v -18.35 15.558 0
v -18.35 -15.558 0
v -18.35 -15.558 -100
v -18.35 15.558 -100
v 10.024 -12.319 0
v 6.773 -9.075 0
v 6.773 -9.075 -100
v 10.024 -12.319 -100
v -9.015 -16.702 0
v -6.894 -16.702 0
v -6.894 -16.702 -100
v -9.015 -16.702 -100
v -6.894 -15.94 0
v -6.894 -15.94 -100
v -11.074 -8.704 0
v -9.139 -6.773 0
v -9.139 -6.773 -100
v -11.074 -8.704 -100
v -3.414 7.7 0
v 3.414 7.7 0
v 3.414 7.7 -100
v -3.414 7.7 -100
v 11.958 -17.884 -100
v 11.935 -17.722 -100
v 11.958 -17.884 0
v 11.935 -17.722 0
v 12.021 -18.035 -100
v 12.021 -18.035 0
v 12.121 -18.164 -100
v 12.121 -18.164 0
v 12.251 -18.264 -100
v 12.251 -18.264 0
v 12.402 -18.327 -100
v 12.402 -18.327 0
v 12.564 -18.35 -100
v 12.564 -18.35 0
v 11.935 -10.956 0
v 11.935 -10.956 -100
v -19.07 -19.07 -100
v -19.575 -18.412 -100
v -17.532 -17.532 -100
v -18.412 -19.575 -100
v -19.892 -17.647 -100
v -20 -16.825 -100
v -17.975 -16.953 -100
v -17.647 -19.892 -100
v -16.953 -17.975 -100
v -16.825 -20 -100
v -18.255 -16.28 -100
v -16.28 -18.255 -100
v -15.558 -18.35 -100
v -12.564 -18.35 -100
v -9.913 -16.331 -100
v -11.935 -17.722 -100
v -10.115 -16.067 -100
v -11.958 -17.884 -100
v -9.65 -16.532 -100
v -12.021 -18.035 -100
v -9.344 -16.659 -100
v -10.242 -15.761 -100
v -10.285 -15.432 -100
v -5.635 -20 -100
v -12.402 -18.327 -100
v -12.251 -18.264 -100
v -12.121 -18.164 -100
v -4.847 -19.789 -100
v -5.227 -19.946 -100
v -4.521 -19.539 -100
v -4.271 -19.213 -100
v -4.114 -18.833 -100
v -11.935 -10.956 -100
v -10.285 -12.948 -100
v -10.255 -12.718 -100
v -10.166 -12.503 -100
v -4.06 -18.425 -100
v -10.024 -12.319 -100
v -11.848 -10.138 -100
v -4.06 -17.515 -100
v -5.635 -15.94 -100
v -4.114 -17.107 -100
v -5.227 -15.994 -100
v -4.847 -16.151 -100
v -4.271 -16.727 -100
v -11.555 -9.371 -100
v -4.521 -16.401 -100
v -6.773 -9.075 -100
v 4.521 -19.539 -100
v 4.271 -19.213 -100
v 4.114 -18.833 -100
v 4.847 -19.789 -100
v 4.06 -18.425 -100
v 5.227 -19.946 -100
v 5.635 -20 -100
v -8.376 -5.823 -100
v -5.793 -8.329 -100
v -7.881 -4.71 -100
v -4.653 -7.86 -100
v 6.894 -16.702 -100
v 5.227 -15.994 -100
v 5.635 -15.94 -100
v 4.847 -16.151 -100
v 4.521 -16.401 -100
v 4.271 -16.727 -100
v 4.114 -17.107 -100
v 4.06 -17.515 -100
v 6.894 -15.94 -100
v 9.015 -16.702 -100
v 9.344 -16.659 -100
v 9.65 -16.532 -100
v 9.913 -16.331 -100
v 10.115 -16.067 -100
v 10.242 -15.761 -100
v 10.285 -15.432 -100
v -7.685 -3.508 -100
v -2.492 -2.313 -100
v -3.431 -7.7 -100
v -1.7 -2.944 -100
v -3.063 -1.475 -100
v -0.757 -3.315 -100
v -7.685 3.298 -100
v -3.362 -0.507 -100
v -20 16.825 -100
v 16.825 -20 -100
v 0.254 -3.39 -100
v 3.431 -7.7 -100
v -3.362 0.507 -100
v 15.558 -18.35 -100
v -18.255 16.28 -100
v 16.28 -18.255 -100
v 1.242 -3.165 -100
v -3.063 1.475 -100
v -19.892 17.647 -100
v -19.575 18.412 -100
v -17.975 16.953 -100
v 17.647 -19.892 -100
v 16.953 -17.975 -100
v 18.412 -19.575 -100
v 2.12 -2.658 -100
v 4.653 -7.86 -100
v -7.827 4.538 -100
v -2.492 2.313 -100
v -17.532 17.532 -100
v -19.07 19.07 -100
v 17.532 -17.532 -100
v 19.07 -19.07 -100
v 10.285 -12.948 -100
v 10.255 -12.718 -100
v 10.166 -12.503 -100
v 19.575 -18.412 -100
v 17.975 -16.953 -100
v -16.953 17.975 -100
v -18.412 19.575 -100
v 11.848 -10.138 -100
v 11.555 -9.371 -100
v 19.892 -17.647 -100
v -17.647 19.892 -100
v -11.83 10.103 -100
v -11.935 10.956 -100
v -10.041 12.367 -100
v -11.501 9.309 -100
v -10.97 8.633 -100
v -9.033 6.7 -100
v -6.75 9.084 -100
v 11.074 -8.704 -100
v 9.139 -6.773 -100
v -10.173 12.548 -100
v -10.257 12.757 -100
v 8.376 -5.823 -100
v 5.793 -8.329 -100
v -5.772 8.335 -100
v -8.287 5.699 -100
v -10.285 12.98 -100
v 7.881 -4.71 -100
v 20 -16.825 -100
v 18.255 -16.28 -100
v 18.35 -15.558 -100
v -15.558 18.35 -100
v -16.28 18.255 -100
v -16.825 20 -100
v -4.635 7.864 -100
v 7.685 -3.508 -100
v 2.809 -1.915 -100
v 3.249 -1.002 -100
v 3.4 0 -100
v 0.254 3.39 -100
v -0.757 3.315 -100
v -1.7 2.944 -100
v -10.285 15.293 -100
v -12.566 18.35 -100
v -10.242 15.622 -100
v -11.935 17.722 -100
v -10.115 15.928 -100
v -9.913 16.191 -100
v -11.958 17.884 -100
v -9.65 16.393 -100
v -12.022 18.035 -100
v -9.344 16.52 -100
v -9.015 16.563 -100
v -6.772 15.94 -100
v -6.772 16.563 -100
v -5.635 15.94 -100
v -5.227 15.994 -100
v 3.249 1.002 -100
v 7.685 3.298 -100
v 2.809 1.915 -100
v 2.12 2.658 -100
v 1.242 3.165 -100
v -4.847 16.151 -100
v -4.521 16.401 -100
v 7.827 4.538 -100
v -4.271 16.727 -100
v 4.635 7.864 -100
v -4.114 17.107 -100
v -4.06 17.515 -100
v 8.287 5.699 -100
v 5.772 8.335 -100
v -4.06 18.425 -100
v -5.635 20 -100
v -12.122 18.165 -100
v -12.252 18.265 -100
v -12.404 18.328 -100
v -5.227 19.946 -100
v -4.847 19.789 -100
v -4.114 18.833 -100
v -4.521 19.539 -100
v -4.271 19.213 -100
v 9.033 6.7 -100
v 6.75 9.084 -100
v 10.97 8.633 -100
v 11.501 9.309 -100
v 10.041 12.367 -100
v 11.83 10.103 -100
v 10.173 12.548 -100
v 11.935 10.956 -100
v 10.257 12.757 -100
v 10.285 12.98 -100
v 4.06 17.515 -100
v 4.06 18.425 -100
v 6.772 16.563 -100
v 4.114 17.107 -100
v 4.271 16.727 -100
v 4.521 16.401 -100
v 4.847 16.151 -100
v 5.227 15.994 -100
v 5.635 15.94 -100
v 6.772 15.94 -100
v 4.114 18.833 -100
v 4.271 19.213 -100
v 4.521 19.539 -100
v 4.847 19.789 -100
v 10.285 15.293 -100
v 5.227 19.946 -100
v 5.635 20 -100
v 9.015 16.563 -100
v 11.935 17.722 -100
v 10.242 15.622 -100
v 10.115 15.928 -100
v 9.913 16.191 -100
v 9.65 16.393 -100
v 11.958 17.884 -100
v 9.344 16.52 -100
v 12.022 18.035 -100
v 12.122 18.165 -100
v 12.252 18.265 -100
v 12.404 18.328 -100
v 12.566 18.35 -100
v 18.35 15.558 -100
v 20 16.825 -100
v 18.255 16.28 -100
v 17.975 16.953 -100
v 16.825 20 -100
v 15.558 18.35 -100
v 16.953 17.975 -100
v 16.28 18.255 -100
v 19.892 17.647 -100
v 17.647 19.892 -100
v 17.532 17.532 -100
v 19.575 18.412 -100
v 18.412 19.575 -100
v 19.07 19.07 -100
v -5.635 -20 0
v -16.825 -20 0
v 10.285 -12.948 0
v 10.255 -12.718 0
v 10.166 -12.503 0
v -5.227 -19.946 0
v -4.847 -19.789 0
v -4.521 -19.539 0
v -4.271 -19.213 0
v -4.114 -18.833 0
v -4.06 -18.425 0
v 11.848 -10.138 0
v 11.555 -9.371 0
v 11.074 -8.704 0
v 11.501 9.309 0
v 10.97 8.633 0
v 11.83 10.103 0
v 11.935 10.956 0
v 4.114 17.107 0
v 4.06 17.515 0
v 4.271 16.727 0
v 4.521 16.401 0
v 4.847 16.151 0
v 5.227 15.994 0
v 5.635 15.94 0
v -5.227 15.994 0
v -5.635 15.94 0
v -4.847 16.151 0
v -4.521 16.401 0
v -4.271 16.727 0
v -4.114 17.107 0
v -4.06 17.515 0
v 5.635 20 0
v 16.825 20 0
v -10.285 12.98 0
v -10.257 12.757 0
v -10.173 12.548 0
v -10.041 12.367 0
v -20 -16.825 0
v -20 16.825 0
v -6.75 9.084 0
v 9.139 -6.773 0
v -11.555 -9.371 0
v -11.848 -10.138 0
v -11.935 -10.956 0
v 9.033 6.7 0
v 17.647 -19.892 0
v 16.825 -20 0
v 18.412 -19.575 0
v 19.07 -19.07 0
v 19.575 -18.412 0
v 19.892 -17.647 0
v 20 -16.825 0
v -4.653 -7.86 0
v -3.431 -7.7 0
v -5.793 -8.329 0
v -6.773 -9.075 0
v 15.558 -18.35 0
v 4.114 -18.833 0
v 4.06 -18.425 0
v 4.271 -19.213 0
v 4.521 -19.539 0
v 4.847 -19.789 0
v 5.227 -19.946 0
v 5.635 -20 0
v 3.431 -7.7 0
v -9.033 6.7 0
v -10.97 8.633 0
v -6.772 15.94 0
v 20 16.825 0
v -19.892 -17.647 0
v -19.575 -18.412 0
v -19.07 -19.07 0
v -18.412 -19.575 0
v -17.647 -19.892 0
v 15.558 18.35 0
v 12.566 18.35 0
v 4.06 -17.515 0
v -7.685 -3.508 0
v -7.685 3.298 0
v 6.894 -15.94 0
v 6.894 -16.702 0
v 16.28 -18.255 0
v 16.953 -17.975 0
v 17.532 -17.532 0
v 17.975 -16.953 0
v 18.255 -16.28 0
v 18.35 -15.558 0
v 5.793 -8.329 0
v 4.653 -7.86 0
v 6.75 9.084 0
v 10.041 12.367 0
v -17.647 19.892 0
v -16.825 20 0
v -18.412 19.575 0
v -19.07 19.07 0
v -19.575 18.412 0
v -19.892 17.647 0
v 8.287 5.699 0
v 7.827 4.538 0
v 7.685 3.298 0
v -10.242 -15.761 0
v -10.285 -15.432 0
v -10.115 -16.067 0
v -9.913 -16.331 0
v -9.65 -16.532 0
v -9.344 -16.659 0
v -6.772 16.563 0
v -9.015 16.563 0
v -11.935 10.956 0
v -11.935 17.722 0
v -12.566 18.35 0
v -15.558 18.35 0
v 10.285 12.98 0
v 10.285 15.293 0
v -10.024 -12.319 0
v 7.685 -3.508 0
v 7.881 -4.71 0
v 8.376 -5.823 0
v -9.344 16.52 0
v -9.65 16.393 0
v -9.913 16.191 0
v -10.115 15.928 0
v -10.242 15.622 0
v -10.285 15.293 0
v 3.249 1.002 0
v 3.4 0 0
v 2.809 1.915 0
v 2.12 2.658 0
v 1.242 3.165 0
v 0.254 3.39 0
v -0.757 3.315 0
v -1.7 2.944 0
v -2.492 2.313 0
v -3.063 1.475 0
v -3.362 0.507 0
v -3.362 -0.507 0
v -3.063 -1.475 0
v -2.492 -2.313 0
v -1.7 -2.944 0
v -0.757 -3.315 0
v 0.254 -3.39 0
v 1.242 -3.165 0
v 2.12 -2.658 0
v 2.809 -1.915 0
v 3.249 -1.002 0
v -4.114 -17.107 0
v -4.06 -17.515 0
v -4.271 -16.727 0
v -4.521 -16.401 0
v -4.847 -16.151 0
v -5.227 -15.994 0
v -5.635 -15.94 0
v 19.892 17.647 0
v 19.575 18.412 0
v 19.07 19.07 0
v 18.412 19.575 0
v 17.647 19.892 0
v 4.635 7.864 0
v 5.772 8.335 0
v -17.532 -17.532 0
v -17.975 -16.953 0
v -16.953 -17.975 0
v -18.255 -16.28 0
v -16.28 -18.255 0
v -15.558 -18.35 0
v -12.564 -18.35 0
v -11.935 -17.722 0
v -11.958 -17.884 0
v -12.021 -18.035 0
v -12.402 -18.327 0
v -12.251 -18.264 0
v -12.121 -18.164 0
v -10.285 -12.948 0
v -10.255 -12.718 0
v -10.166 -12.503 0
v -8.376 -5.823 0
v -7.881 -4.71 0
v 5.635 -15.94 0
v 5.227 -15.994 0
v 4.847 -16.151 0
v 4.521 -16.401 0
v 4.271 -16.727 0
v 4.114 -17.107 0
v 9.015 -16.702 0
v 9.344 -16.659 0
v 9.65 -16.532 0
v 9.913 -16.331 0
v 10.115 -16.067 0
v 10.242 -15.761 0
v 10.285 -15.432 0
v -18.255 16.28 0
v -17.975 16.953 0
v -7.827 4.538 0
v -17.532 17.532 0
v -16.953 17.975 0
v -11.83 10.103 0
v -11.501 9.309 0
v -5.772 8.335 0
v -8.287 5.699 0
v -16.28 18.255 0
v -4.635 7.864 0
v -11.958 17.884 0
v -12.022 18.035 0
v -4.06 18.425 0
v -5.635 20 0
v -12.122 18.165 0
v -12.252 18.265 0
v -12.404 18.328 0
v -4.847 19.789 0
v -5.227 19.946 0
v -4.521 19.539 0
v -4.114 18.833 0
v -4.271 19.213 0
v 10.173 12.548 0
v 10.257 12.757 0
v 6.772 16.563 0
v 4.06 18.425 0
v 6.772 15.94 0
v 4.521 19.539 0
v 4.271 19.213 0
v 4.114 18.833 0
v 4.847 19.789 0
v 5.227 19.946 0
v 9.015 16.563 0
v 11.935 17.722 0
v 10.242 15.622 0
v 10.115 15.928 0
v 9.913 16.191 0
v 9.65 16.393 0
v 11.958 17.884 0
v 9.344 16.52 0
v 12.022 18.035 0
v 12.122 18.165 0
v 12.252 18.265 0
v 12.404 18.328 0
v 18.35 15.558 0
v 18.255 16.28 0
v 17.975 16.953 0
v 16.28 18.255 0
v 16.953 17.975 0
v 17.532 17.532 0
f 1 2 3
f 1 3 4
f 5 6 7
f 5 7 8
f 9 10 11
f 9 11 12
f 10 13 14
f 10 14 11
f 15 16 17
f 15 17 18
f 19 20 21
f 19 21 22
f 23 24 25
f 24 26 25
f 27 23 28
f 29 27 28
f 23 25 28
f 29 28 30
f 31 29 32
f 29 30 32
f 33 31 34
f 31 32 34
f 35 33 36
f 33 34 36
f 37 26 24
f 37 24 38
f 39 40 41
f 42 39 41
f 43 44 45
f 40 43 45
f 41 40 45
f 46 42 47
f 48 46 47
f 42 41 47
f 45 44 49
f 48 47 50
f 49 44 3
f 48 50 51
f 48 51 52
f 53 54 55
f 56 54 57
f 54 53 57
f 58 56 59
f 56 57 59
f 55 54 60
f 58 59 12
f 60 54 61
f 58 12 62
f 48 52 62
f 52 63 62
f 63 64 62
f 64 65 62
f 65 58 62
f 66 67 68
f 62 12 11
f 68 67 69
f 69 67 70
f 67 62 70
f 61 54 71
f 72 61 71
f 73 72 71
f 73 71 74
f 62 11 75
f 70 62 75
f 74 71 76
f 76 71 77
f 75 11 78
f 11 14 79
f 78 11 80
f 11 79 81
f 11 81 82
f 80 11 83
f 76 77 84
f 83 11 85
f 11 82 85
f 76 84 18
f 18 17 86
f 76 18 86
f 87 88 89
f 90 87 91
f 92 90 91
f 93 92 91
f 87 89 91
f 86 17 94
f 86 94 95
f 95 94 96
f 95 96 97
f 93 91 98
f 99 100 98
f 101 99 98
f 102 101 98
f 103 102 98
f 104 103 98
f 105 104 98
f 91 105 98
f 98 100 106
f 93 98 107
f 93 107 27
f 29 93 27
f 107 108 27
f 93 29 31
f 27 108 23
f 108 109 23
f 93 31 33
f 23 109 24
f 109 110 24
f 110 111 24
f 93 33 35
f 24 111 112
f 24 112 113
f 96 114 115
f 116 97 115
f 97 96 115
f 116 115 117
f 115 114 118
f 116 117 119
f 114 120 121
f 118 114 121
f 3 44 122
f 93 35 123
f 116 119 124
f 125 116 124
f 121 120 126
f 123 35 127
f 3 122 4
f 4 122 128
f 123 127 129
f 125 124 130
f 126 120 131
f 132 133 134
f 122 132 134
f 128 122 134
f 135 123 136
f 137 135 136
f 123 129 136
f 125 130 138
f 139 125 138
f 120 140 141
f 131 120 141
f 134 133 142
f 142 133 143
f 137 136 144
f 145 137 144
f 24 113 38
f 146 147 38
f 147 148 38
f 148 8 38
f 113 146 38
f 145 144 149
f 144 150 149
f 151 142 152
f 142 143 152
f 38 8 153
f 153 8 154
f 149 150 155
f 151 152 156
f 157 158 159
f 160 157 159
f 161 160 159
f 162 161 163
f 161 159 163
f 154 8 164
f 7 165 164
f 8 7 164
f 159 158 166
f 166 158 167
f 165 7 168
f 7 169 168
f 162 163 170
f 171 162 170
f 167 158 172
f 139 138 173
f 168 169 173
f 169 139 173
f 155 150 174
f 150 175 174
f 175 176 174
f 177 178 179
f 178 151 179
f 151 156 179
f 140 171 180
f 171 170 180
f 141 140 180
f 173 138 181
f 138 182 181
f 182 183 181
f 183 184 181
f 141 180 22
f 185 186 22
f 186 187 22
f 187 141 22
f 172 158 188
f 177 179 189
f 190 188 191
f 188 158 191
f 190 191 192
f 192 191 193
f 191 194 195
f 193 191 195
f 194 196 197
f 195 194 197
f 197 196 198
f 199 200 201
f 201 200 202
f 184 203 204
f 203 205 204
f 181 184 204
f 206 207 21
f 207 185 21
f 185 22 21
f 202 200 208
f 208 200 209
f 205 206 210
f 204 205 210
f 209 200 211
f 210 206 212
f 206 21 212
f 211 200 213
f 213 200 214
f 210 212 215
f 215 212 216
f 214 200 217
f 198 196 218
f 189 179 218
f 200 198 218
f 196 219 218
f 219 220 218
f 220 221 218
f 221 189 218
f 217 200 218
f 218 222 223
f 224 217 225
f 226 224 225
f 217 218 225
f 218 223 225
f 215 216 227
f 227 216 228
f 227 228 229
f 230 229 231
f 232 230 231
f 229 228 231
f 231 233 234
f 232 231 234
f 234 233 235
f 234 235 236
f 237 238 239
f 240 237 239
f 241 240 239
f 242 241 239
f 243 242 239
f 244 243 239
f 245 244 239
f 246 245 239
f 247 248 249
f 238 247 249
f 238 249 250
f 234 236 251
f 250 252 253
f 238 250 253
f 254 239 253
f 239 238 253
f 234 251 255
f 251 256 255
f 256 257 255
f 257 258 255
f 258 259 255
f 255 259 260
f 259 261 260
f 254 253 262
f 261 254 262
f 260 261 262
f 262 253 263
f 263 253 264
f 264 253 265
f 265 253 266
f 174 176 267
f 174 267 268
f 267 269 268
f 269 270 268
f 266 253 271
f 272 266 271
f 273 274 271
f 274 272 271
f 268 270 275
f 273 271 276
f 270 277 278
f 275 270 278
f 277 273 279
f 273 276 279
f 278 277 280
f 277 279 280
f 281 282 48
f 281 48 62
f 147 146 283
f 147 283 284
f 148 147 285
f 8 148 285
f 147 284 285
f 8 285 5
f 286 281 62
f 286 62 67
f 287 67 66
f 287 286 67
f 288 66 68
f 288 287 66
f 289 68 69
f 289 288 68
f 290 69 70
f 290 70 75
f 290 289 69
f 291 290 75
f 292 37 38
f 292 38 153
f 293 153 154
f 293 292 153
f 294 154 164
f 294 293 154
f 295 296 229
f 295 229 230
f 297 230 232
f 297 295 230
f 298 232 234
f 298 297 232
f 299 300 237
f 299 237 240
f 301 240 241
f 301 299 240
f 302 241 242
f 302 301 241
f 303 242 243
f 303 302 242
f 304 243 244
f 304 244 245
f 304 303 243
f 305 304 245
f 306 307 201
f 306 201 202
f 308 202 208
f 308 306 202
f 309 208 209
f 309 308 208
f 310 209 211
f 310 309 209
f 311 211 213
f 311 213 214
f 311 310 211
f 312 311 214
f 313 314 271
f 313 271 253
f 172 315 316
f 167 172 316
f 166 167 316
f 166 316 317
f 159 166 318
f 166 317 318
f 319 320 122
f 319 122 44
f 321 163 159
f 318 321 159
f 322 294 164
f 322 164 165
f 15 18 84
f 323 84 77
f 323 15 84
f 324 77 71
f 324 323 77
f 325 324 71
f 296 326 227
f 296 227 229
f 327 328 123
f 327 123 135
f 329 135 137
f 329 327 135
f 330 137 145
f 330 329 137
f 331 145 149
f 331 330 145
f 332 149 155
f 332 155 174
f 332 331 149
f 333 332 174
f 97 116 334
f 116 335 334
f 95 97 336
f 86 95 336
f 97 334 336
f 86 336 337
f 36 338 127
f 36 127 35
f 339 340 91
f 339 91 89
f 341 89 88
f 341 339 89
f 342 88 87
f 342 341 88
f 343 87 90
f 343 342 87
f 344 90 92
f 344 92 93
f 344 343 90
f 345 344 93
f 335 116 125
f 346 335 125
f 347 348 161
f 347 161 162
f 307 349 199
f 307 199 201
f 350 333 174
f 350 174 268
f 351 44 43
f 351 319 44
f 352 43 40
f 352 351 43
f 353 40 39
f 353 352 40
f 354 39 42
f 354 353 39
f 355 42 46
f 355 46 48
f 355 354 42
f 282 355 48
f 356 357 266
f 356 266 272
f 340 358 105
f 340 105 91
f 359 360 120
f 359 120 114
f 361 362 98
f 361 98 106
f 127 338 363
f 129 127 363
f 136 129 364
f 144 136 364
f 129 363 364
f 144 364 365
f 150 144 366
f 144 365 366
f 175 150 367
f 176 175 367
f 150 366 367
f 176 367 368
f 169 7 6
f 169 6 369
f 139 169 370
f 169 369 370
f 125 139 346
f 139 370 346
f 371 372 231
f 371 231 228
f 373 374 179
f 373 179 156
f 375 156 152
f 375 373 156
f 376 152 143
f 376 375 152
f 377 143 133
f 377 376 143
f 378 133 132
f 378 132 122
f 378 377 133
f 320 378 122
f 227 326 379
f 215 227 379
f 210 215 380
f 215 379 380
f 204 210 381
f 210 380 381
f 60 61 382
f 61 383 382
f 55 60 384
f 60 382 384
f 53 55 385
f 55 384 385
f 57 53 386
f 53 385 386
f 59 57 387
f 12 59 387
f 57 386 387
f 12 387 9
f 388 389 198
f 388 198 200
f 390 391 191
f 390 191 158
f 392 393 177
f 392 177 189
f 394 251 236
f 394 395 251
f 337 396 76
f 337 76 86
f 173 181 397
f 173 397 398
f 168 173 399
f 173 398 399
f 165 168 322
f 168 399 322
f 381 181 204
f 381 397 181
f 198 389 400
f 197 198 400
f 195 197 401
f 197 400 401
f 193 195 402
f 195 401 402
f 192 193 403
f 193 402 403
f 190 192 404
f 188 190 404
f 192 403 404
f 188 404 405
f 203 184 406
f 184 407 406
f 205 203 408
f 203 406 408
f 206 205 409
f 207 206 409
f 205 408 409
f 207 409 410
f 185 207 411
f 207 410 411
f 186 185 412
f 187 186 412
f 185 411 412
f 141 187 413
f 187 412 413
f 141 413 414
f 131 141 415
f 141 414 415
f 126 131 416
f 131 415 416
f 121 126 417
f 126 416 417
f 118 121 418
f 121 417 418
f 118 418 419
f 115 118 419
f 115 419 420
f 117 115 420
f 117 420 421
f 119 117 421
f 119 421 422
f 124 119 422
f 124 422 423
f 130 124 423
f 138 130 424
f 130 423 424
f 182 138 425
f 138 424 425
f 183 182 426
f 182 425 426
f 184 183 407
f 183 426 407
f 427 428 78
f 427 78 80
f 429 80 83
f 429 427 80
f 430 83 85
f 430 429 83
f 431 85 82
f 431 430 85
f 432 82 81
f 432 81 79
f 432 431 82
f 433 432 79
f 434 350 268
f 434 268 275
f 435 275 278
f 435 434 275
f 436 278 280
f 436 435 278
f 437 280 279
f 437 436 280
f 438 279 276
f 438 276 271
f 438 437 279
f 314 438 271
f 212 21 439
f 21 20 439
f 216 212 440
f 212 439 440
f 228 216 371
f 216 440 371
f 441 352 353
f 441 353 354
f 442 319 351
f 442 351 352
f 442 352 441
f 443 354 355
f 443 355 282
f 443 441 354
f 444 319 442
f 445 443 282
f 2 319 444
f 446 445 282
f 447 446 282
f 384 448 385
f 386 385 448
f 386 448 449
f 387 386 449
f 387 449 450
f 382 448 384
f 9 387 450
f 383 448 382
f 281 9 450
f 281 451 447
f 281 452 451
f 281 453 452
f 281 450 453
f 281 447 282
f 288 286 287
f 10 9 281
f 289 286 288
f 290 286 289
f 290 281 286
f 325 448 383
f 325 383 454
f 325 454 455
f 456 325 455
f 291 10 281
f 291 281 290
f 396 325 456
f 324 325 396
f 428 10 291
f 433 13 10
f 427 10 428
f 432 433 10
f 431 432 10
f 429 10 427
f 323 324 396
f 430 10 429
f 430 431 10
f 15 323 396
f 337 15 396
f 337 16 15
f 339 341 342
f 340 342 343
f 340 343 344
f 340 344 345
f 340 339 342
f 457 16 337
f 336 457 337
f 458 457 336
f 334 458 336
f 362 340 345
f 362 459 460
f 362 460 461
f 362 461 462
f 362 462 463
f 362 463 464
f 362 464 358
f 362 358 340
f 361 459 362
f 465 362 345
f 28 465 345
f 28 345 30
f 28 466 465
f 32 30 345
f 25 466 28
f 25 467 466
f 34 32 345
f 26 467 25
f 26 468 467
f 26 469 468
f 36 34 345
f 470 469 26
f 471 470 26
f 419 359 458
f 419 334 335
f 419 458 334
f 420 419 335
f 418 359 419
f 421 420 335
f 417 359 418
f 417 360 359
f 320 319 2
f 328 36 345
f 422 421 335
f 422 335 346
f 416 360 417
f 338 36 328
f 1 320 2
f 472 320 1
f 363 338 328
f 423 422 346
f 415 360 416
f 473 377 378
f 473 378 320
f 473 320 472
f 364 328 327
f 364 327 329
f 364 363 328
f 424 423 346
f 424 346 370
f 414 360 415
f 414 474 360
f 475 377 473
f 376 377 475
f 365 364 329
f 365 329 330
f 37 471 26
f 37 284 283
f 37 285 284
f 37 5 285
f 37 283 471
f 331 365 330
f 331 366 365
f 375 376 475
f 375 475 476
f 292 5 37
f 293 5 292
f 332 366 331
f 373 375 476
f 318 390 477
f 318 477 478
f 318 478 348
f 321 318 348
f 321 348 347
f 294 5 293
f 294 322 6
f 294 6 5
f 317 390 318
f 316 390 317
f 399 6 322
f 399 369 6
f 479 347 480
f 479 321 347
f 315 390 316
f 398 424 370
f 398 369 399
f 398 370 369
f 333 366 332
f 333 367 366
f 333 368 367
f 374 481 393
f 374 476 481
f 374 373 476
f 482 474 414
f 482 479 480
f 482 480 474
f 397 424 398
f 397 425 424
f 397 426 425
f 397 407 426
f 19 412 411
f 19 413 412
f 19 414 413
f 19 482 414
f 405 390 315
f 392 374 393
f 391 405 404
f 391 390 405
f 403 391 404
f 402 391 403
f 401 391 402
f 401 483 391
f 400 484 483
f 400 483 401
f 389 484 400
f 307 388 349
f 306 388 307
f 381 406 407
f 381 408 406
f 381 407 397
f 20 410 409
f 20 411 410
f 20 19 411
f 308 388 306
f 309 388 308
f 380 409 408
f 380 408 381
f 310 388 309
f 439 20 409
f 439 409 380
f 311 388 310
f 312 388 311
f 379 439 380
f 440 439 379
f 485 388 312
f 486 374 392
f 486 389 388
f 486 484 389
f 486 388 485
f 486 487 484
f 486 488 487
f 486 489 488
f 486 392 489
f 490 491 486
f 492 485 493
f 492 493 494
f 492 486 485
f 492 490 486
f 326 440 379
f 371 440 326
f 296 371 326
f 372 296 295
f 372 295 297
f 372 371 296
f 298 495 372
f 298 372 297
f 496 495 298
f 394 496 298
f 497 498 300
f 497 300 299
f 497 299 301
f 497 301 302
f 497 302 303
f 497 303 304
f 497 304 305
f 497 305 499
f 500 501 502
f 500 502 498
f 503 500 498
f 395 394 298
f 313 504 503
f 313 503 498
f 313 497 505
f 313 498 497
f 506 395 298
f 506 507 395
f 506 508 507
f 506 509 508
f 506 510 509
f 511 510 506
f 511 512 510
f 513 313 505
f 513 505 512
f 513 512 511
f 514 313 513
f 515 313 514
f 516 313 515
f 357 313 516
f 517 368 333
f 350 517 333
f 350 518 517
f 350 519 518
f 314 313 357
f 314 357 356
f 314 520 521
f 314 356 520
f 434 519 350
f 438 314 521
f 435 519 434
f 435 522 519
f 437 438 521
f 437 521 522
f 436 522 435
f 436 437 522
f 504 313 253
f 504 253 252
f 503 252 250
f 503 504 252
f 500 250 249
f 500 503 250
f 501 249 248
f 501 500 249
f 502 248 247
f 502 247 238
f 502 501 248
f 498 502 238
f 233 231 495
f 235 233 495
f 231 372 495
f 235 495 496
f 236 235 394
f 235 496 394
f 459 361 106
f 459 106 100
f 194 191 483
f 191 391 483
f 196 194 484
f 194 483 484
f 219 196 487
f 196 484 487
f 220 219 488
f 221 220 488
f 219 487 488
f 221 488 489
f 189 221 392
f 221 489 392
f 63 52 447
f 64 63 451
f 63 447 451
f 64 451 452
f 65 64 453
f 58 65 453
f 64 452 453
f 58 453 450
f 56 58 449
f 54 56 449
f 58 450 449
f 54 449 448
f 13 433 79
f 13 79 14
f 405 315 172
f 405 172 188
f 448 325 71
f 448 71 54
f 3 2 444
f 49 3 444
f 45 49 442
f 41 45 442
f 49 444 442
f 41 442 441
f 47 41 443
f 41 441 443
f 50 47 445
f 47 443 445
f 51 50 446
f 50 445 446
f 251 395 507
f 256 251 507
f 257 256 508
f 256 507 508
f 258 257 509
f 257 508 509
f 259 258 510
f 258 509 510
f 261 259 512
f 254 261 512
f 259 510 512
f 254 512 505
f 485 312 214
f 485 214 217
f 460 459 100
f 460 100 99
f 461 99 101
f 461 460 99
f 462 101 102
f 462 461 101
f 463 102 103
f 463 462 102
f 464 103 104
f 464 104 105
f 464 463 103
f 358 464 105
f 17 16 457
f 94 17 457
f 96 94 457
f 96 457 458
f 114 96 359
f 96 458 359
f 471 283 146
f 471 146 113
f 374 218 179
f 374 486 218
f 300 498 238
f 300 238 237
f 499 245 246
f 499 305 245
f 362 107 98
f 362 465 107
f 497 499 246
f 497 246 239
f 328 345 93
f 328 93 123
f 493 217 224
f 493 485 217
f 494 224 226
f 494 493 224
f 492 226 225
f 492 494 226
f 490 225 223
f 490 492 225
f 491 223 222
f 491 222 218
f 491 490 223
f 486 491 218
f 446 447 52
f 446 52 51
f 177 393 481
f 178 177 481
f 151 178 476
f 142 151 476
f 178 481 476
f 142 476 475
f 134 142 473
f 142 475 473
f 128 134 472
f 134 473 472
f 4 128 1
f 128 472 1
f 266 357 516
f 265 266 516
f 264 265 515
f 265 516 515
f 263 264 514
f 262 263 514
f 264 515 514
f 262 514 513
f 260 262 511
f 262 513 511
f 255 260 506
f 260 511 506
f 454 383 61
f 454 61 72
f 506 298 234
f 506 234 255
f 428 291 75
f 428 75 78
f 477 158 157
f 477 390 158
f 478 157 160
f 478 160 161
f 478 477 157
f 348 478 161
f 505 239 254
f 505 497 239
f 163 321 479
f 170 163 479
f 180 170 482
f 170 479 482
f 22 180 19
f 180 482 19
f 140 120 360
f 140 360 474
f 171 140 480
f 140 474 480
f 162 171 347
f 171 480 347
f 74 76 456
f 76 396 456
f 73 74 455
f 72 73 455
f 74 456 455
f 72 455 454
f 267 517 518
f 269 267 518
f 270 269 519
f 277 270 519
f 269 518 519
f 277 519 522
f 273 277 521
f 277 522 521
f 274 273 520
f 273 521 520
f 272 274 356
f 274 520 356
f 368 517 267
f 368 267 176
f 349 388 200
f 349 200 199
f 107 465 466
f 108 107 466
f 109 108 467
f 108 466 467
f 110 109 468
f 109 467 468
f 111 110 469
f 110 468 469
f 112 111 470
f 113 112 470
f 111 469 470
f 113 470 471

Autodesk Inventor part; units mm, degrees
ref_plane "YZ Plane" through (0, 0, 0) normal (1, 0, 0) x (0, 1, 0)
ref_plane "XZ Plane" through (0, 0, 0) normal (0, 1, 0) x (-1, 0, 0)
ref_plane "XY Plane" through (0, 0, 0) normal (0, 0, 1) x (1, 0, 0)
sketch "Sketch1" plane through (0, 0, 0) normal (0, 0, 1) x (1, 0, 0)
  line L0 (9.015, -16.7025) -> (6.8938, -16.7025)
  line L1 (6.8938, -16.7025) -> (6.8938, -15.94)
  arc A0 (9.015, -16.7025) -> (10.285, -15.4325) centre (9.015, -15.4325) ccw
  line L2 (6.8938, -15.94) -> (5.6348, -15.94)
  line L3 (10.285, -12.9481) -> (10.285, -15.4325)
  arc A1 (5.6348, -15.94) -> (4.06, -17.5148) centre (5.6348, -17.5148) ccw
  arc A2 (10.285, -12.9481) -> (10.024, -12.3188) centre (9.396, -12.9481) ccw
  line L4 (4.06, -17.5148) -> (4.06, -18.4252)
  line L5 (6.7733, -9.0747) -> (10.024, -12.3188)
  arc A3 (4.06, -18.4252) -> (5.6348, -20) centre (5.6348, -18.4252) ccw
  arc A4 (6.7733, -9.0747) -> (3.4312, -7.7) centre (3.4312, -12.4498) ccw
  line L6 (5.6348, -20) -> (16.825, -20)
  line L7 (-3.4312, -7.7) -> (3.4312, -7.7)
  arc A5 (16.825, -20) -> (20, -16.825) centre (16.825, -16.825) ccw
  arc A6 (-3.4312, -7.7) -> (-6.7733, -9.0747) centre (-3.4312, -12.4498) ccw
  line L8 (20, -16.825) -> (20, 16.825)
  line L9 (-10.024, -12.3188) -> (-6.7733, -9.0747)
  arc A7 (20, 16.825) -> (16.825, 20) centre (16.825, 16.825) ccw
  arc A8 (-10.024, -12.3188) -> (-10.285, -12.9481) centre (-9.396, -12.9481) ccw
  line L10 (16.825, 20) -> (5.6348, 20)
  line L11 (-10.285, -15.4325) -> (-10.285, -12.9481)
  arc A9 (5.6348, 20) -> (4.06, 18.4252) centre (5.6348, 18.4252) ccw
  arc A10 (-10.285, -15.4325) -> (-9.015, -16.7025) centre (-9.015, -15.4325) ccw
  line L12 (4.06, 18.4252) -> (4.06, 17.5148)
  line L13 (-6.8938, -16.7025) -> (-9.015, -16.7025)
  arc A11 (4.06, 17.5148) -> (5.6348, 15.94) centre (5.6348, 17.5148) ccw
  line L14 (-6.8938, -15.94) -> (-6.8938, -16.7025)
  line L15 (5.6348, 15.94) -> (6.7718, 15.94)
  line L16 (-5.6348, -15.94) -> (-6.8938, -15.94)
  line L17 (6.7718, 15.94) -> (6.7718, 16.5629)
  arc A12 (-4.06, -17.5148) -> (-5.6348, -15.94) centre (-5.6348, -17.5148) ccw
  line L18 (6.7718, 16.5629) -> (9.015, 16.5629)
  line L19 (-4.06, -18.4252) -> (-4.06, -17.5148)
  arc A13 (10.285, 15.2929) -> (9.015, 16.5629) centre (9.015, 15.2929) ccw
  arc A14 (-5.6348, -20) -> (-4.06, -18.4252) centre (-5.6348, -18.4252) ccw
  line L20 (10.285, 15.2929) -> (10.285, 12.9795)
  line L21 (-16.825, -20) -> (-5.6348, -20)
  arc A15 (10.0407, 12.3673) -> (10.285, 12.9795) centre (9.396, 12.9795) ccw
  arc A16 (-20, -16.825) -> (-16.825, -20) centre (-16.825, -16.825) ccw
  line L22 (10.0407, 12.3673) -> (6.7505, 9.0839)
  line L23 (-20, 16.825) -> (-20, -16.825)
  arc A17 (3.4141, 7.7) -> (6.7505, 9.0839) centre (3.3992, 12.4498) ccw
  arc A18 (-16.825, 20) -> (-20, 16.825) centre (-16.825, 16.825) ccw
  line L24 (3.4141, 7.7) -> (-3.4141, 7.7)
  line L25 (-5.6348, 20) -> (-16.825, 20)
  arc A19 (-6.7505, 9.0839) -> (-3.4141, 7.7) centre (-3.3992, 12.4498) ccw
  arc A20 (-4.06, 18.4252) -> (-5.6348, 20) centre (-5.6348, 18.4252) ccw
  line L26 (-6.7505, 9.0839) -> (-10.0407, 12.3673)
  line L27 (-4.06, 17.5148) -> (-4.06, 18.4252)
  arc A21 (-10.285, 12.9795) -> (-10.0407, 12.3673) centre (-9.396, 12.9795) ccw
  arc A22 (-5.6348, 15.94) -> (-4.06, 17.5148) centre (-5.6348, 17.5148) ccw
  line L28 (-10.285, 12.9795) -> (-10.285, 15.2929)
  line L29 (-6.7718, 15.94) -> (-5.6348, 15.94)
  arc A23 (-9.015, 16.5629) -> (-10.285, 15.2929) centre (-9.015, 15.2929) ccw
  line L30 (-6.7718, 16.5629) -> (-6.7718, 15.94)
  line L31 (-9.015, 16.5629) -> (-6.7718, 16.5629)
  arc A24 (11.935, -17.7218) -> (12.5645, -18.35) centre (12.57, -17.715) ccw
  line L32 (11.935, -17.7218) -> (11.935, -10.9555)
  line L33 (15.5575, -18.35) -> (12.5645, -18.35)
  arc A25 (11.935, -10.9555) -> (11.0739, -8.7045) centre (8.7609, -10.8795) ccw
  arc A26 (15.5575, -18.35) -> (18.35, -15.5575) centre (15.556, -15.556) ccw
  line L34 (11.0739, -8.7045) -> (9.1386, -6.7731)
  line L35 (18.35, 15.5575) -> (18.35, -15.5575)
  arc A27 (7.685, -3.508) -> (9.1386, -6.7731) centre (12.4322, -3.3507) ccw
  arc A28 (18.35, 15.5575) -> (15.5575, 18.35) centre (15.556, 15.556) ccw
  line L36 (7.685, -3.508) -> (7.685, 3.2977)
  line L37 (12.566, 18.35) -> (15.5575, 18.35)
  arc A29 (9.033, 6.6995) -> (7.685, 3.2977) centre (12.434, 3.3839) ccw
  arc A30 (12.566, 18.35) -> (11.935, 17.7218) centre (12.57, 17.715) ccw
  line L38 (9.033, 6.6995) -> (10.9703, 8.6329)
  line L39 (11.935, 10.9555) -> (11.935, 17.7218)
  arc A31 (10.9703, 8.6329) -> (11.935, 10.9555) centre (8.7603, 10.9125) ccw
  circle A32 centre (0, 0) radius 3.4
  arc A33 (-11.0739, -8.7045) -> (-11.935, -10.9555) centre (-8.7609, -10.8795) ccw
  line L40 (-11.935, -10.9555) -> (-11.935, -17.7218)
  line L41 (-9.1386, -6.7731) -> (-11.0739, -8.7045)
  arc A34 (-12.5645, -18.35) -> (-11.935, -17.7218) centre (-12.57, -17.715) ccw
  arc A35 (-9.1386, -6.7731) -> (-7.685, -3.508) centre (-12.4322, -3.3507) ccw
  line L42 (-12.5645, -18.35) -> (-15.5575, -18.35)
  line L43 (-7.685, 3.2977) -> (-7.685, -3.508)
  arc A36 (-18.35, -15.5575) -> (-15.5575, -18.35) centre (-15.556, -15.556) ccw
  arc A37 (-7.685, 3.2977) -> (-9.033, 6.6995) centre (-12.434, 3.3839) ccw
  line L44 (-18.35, -15.5575) -> (-18.35, 15.5575)
  line L45 (-10.9703, 8.6329) -> (-9.033, 6.6995)
  arc A38 (-15.5575, 18.35) -> (-18.35, 15.5575) centre (-15.556, 15.556) ccw
  arc A39 (-11.935, 10.9555) -> (-10.9703, 8.6329) centre (-8.7603, 10.9125) ccw
  line L46 (-15.5575, 18.35) -> (-12.566, 18.35)
  line L47 (-11.935, 17.7218) -> (-11.935, 10.9555)
  arc A40 (-11.935, 17.7218) -> (-12.566, 18.35) centre (-12.57, 17.715) ccw
extrude "Extrusion1" add sketch "Sketch1" against normal blind 100
properties part number "40-4004-BLACK-FB"
